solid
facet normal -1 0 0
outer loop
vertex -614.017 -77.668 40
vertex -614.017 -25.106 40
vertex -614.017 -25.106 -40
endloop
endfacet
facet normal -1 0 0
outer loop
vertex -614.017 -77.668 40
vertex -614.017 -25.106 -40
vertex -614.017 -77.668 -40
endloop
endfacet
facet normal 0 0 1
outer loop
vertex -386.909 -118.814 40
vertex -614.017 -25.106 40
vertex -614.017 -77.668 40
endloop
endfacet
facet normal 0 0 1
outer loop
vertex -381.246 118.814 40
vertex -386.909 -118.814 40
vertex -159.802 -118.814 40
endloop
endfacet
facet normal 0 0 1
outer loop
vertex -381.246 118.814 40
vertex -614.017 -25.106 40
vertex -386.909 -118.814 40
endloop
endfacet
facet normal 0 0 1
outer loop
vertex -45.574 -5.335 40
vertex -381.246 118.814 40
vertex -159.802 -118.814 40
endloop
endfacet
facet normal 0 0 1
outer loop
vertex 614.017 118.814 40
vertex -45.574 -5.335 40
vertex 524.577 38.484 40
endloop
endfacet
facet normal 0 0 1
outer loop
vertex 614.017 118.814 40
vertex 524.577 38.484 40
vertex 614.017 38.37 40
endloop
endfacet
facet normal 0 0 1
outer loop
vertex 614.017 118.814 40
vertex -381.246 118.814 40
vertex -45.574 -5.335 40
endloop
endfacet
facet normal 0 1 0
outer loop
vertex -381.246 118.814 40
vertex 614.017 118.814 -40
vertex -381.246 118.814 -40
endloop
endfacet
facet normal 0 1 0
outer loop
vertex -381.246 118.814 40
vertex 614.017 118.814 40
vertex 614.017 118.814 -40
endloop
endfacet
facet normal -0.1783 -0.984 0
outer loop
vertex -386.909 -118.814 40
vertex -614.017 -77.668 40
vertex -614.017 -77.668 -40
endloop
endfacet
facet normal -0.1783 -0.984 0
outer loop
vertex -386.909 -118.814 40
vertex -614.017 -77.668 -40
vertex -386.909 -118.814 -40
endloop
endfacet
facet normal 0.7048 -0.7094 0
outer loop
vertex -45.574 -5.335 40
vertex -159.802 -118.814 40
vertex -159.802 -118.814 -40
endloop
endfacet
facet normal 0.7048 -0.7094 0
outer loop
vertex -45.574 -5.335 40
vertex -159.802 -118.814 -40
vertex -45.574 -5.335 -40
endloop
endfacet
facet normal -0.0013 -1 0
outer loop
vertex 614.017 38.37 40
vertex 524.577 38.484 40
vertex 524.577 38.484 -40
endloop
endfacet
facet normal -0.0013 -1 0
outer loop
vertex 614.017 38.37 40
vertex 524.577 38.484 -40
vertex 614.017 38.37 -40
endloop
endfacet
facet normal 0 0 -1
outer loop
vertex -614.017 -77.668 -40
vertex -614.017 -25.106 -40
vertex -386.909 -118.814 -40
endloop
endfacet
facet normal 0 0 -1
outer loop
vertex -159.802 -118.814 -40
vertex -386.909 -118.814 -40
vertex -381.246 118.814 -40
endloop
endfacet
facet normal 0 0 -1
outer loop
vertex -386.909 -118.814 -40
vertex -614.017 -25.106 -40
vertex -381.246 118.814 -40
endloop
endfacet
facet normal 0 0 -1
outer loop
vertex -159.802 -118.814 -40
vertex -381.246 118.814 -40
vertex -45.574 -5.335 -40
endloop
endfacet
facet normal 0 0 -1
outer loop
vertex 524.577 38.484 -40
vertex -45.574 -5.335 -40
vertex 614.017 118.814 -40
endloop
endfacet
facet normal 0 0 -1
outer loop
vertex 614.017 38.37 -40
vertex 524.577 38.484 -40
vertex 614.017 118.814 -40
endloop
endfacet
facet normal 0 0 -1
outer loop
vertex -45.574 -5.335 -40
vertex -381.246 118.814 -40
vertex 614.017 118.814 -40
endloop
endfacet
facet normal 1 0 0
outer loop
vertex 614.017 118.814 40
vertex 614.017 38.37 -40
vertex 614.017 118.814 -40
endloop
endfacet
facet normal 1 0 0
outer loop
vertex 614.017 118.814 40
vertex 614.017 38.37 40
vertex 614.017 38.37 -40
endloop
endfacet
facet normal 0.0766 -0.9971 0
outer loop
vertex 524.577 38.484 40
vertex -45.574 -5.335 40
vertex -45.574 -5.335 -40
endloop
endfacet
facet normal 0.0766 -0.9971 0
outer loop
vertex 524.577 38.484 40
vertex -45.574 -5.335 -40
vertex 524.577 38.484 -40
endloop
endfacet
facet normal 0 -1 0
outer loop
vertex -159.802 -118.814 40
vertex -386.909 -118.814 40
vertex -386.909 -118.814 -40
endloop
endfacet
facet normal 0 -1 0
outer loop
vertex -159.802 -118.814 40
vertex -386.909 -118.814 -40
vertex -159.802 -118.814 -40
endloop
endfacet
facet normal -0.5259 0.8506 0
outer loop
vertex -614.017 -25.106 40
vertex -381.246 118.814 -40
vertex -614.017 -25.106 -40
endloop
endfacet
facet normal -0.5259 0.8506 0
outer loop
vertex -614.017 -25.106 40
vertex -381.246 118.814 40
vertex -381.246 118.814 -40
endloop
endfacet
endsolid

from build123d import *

# Parameters (mm, degrees)
BOSS_EXTRUDE1_DEPTH = 40


with BuildPart() as part:
    # Sketch1 → Boss-Extrude1 (new body, symmetric)
    with BuildSketch(Plane.XY):
        Polygon((576.530281573, 118.813515451), (-381.24605126, 118.813515451), (-614.016581357, -25.106107257), (-614.016581357, -77.668223147), (-386.909457622, -118.813515451), (-159.802333887, -118.813515451), (-45.574406616, -5.335493482), (524.577232755, 38.483934534), (614.016581357, 38.369843561), (614.016581357, 118.813515451), align=None)
    extrude(amount=BOSS_EXTRUDE1_DEPTH, both=True)


solid = part.part
